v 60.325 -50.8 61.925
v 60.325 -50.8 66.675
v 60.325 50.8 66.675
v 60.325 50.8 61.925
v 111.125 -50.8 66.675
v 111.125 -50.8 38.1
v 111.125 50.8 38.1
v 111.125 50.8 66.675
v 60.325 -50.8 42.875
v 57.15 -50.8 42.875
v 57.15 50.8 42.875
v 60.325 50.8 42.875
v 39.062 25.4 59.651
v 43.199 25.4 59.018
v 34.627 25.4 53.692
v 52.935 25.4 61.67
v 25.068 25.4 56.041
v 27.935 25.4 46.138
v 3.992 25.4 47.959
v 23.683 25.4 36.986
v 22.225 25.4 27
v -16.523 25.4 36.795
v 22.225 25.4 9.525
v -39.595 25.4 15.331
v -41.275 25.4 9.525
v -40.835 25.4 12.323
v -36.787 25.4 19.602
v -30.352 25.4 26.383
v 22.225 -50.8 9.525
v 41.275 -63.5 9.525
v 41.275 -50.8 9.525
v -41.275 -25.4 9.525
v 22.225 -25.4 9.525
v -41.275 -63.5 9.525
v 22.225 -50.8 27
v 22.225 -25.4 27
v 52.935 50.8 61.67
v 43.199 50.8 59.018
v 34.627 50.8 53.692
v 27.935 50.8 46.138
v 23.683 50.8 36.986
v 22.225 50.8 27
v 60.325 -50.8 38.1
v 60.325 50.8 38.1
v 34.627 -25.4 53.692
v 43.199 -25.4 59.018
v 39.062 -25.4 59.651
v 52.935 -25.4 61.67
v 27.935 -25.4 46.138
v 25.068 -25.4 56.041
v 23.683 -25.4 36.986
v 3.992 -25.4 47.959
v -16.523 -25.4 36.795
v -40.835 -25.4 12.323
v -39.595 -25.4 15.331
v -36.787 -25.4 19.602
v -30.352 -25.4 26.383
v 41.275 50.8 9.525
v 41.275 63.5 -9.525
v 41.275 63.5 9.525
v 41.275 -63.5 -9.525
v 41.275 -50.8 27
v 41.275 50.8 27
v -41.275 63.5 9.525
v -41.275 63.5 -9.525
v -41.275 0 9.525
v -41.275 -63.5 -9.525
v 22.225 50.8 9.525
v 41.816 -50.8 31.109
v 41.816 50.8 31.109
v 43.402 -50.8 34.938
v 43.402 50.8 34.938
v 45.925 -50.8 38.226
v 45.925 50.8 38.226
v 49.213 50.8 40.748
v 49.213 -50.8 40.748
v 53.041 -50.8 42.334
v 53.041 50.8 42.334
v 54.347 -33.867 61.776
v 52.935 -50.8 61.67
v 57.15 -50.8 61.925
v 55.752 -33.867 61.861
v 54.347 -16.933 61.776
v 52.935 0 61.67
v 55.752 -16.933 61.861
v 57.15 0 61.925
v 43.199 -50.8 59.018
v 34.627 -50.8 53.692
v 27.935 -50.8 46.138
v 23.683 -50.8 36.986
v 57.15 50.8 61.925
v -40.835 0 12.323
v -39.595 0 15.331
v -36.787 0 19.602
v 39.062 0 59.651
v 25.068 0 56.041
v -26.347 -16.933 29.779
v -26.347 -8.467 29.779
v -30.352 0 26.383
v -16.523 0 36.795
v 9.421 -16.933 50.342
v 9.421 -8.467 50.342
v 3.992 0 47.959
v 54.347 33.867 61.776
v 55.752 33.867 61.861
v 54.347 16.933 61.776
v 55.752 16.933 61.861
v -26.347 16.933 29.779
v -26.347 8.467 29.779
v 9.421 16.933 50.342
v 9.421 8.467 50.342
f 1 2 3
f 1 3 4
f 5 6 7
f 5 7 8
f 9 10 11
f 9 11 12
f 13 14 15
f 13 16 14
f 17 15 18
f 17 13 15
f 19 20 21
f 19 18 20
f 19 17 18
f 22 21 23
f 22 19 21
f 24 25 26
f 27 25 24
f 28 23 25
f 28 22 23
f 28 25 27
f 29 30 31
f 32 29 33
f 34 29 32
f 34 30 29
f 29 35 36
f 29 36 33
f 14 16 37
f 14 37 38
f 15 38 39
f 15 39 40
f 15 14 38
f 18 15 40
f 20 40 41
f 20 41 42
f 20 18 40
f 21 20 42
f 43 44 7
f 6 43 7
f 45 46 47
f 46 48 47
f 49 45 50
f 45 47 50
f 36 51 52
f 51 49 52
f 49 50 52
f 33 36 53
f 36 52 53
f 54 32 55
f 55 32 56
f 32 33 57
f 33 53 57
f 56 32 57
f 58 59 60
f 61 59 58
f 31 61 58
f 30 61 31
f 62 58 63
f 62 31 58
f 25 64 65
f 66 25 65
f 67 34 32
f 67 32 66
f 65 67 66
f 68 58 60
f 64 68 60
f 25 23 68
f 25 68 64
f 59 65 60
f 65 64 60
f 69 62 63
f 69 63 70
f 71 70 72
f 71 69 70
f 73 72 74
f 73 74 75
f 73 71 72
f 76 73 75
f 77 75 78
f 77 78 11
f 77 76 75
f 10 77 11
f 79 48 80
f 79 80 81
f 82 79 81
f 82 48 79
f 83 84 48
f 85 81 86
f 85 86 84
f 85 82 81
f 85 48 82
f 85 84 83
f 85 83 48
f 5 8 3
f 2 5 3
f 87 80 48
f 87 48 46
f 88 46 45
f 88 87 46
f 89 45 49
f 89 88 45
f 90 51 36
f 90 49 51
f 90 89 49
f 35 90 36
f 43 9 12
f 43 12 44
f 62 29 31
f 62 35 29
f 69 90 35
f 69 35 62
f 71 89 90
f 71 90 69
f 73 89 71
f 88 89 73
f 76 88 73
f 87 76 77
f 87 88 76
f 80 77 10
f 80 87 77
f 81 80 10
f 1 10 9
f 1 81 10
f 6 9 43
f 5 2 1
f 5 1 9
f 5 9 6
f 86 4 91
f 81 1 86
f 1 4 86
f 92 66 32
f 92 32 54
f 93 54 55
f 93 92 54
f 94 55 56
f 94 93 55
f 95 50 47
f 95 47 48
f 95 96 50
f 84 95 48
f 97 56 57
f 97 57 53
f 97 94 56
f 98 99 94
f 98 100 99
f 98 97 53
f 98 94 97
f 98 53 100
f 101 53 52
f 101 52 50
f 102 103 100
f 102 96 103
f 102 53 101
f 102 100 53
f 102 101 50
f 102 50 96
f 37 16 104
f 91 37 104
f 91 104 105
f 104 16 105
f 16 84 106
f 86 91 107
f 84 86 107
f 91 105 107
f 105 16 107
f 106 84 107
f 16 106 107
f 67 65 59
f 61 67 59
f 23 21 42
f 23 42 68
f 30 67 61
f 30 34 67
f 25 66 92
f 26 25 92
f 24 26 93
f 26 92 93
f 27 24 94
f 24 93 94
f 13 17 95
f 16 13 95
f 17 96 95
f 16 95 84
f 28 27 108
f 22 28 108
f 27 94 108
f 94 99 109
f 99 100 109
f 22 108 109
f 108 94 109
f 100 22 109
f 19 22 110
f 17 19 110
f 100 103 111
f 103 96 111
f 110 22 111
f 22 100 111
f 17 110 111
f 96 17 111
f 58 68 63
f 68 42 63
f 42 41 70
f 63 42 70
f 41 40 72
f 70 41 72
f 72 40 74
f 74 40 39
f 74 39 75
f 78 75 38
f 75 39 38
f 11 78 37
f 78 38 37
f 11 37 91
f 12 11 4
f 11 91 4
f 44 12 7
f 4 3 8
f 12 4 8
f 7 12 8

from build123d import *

# Parameters (mm, degrees)
F1_DEPTH = 63.5
F2_DEPTH = 25.4
F0_W     = 25.3307413936
F0_H     = 19.05
F3_DEPTH = 50.8


with BuildPart() as f1:
    # F0 (on Front) → F1 (new body, symmetric)
    with BuildSketch(Plane.XZ):
        Polygon((-41.275, -9.525), (41.275, -9.525), (41.275, 9.525), (22.225, 9.525), (-41.275, 9.525), align=None)
    extrude(amount=F1_DEPTH, both=True)

    # F0 (on Front) → F2 (join, symmetric)
    with BuildSketch(Plane.XZ):
        with BuildLine():
            add(Edge.make_bspline(
                [(-41.275, 9.525), (-41.1319843278, 26.4440384857), (9.9134722481, 58.1405185942), (52.9354553425, 61.6699741315)],
                knots=[0, 0, 0, 0, 107.9558196003, 107.9558196003, 107.9558196003, 107.9558196003], degree=3))
            Line((-41.275, 9.525), (22.225, 9.525))
            Line((22.225, 9.525), (22.225, 27.0002))
            ThreePointArc((22.225, 27.0002), (31.0066586187, 50.1579487338), (52.9354553425, 61.6699741315))
        make_face()
    extrude(amount=F2_DEPTH, both=True)

    # F0 (on Front) → F3 (join, symmetric)
    with BuildSketch(Plane.XZ):
        with BuildLine():
            Line((22.225, 9.525), (41.275, 9.525))
            Line((41.275, 9.525), (41.275, 27.0002))
            ThreePointArc((41.275, 27.0002), (45.9246798487, 38.2255201513), (57.15, 42.8752))
            Line((57.15, 42.8752), (60.325, 42.8752))
            Line((60.325, 42.8752), (60.325, 61.9252))
            Line((60.325, 61.9252), (57.15, 61.9252))
            add(Edge.make_bspline(
                [(52.9354553425, 61.6699741315), (54.3496711259, 61.7859941605), (55.7552170324, 61.8715779158), (57.15, 61.9252)],
                knots=[107.9558196003, 107.9558196003, 107.9558196003, 107.9558196003, 111.5045361635, 111.5045361635, 111.5045361635, 111.5045361635], degree=3))
            ThreePointArc((52.9354553425, 61.6699741315), (31.0066586187, 50.1579487338), (22.225, 27.0002))
            Line((22.225, 27.0002), (22.225, 9.525))
        make_face()
        with Locations((72.9903706968, 52.4002)):
            Rectangle(F0_W, F0_H)
        Polygon((85.6557413936, 42.8752), (60.325, 42.8752), (60.325, 38.1), (111.125, 38.1), (111.125, 66.675), (60.325, 66.675), (60.325, 61.9252), (85.6557413936, 61.9252), align=None)
    extrude(amount=F3_DEPTH, both=True)


solid = f1.part
